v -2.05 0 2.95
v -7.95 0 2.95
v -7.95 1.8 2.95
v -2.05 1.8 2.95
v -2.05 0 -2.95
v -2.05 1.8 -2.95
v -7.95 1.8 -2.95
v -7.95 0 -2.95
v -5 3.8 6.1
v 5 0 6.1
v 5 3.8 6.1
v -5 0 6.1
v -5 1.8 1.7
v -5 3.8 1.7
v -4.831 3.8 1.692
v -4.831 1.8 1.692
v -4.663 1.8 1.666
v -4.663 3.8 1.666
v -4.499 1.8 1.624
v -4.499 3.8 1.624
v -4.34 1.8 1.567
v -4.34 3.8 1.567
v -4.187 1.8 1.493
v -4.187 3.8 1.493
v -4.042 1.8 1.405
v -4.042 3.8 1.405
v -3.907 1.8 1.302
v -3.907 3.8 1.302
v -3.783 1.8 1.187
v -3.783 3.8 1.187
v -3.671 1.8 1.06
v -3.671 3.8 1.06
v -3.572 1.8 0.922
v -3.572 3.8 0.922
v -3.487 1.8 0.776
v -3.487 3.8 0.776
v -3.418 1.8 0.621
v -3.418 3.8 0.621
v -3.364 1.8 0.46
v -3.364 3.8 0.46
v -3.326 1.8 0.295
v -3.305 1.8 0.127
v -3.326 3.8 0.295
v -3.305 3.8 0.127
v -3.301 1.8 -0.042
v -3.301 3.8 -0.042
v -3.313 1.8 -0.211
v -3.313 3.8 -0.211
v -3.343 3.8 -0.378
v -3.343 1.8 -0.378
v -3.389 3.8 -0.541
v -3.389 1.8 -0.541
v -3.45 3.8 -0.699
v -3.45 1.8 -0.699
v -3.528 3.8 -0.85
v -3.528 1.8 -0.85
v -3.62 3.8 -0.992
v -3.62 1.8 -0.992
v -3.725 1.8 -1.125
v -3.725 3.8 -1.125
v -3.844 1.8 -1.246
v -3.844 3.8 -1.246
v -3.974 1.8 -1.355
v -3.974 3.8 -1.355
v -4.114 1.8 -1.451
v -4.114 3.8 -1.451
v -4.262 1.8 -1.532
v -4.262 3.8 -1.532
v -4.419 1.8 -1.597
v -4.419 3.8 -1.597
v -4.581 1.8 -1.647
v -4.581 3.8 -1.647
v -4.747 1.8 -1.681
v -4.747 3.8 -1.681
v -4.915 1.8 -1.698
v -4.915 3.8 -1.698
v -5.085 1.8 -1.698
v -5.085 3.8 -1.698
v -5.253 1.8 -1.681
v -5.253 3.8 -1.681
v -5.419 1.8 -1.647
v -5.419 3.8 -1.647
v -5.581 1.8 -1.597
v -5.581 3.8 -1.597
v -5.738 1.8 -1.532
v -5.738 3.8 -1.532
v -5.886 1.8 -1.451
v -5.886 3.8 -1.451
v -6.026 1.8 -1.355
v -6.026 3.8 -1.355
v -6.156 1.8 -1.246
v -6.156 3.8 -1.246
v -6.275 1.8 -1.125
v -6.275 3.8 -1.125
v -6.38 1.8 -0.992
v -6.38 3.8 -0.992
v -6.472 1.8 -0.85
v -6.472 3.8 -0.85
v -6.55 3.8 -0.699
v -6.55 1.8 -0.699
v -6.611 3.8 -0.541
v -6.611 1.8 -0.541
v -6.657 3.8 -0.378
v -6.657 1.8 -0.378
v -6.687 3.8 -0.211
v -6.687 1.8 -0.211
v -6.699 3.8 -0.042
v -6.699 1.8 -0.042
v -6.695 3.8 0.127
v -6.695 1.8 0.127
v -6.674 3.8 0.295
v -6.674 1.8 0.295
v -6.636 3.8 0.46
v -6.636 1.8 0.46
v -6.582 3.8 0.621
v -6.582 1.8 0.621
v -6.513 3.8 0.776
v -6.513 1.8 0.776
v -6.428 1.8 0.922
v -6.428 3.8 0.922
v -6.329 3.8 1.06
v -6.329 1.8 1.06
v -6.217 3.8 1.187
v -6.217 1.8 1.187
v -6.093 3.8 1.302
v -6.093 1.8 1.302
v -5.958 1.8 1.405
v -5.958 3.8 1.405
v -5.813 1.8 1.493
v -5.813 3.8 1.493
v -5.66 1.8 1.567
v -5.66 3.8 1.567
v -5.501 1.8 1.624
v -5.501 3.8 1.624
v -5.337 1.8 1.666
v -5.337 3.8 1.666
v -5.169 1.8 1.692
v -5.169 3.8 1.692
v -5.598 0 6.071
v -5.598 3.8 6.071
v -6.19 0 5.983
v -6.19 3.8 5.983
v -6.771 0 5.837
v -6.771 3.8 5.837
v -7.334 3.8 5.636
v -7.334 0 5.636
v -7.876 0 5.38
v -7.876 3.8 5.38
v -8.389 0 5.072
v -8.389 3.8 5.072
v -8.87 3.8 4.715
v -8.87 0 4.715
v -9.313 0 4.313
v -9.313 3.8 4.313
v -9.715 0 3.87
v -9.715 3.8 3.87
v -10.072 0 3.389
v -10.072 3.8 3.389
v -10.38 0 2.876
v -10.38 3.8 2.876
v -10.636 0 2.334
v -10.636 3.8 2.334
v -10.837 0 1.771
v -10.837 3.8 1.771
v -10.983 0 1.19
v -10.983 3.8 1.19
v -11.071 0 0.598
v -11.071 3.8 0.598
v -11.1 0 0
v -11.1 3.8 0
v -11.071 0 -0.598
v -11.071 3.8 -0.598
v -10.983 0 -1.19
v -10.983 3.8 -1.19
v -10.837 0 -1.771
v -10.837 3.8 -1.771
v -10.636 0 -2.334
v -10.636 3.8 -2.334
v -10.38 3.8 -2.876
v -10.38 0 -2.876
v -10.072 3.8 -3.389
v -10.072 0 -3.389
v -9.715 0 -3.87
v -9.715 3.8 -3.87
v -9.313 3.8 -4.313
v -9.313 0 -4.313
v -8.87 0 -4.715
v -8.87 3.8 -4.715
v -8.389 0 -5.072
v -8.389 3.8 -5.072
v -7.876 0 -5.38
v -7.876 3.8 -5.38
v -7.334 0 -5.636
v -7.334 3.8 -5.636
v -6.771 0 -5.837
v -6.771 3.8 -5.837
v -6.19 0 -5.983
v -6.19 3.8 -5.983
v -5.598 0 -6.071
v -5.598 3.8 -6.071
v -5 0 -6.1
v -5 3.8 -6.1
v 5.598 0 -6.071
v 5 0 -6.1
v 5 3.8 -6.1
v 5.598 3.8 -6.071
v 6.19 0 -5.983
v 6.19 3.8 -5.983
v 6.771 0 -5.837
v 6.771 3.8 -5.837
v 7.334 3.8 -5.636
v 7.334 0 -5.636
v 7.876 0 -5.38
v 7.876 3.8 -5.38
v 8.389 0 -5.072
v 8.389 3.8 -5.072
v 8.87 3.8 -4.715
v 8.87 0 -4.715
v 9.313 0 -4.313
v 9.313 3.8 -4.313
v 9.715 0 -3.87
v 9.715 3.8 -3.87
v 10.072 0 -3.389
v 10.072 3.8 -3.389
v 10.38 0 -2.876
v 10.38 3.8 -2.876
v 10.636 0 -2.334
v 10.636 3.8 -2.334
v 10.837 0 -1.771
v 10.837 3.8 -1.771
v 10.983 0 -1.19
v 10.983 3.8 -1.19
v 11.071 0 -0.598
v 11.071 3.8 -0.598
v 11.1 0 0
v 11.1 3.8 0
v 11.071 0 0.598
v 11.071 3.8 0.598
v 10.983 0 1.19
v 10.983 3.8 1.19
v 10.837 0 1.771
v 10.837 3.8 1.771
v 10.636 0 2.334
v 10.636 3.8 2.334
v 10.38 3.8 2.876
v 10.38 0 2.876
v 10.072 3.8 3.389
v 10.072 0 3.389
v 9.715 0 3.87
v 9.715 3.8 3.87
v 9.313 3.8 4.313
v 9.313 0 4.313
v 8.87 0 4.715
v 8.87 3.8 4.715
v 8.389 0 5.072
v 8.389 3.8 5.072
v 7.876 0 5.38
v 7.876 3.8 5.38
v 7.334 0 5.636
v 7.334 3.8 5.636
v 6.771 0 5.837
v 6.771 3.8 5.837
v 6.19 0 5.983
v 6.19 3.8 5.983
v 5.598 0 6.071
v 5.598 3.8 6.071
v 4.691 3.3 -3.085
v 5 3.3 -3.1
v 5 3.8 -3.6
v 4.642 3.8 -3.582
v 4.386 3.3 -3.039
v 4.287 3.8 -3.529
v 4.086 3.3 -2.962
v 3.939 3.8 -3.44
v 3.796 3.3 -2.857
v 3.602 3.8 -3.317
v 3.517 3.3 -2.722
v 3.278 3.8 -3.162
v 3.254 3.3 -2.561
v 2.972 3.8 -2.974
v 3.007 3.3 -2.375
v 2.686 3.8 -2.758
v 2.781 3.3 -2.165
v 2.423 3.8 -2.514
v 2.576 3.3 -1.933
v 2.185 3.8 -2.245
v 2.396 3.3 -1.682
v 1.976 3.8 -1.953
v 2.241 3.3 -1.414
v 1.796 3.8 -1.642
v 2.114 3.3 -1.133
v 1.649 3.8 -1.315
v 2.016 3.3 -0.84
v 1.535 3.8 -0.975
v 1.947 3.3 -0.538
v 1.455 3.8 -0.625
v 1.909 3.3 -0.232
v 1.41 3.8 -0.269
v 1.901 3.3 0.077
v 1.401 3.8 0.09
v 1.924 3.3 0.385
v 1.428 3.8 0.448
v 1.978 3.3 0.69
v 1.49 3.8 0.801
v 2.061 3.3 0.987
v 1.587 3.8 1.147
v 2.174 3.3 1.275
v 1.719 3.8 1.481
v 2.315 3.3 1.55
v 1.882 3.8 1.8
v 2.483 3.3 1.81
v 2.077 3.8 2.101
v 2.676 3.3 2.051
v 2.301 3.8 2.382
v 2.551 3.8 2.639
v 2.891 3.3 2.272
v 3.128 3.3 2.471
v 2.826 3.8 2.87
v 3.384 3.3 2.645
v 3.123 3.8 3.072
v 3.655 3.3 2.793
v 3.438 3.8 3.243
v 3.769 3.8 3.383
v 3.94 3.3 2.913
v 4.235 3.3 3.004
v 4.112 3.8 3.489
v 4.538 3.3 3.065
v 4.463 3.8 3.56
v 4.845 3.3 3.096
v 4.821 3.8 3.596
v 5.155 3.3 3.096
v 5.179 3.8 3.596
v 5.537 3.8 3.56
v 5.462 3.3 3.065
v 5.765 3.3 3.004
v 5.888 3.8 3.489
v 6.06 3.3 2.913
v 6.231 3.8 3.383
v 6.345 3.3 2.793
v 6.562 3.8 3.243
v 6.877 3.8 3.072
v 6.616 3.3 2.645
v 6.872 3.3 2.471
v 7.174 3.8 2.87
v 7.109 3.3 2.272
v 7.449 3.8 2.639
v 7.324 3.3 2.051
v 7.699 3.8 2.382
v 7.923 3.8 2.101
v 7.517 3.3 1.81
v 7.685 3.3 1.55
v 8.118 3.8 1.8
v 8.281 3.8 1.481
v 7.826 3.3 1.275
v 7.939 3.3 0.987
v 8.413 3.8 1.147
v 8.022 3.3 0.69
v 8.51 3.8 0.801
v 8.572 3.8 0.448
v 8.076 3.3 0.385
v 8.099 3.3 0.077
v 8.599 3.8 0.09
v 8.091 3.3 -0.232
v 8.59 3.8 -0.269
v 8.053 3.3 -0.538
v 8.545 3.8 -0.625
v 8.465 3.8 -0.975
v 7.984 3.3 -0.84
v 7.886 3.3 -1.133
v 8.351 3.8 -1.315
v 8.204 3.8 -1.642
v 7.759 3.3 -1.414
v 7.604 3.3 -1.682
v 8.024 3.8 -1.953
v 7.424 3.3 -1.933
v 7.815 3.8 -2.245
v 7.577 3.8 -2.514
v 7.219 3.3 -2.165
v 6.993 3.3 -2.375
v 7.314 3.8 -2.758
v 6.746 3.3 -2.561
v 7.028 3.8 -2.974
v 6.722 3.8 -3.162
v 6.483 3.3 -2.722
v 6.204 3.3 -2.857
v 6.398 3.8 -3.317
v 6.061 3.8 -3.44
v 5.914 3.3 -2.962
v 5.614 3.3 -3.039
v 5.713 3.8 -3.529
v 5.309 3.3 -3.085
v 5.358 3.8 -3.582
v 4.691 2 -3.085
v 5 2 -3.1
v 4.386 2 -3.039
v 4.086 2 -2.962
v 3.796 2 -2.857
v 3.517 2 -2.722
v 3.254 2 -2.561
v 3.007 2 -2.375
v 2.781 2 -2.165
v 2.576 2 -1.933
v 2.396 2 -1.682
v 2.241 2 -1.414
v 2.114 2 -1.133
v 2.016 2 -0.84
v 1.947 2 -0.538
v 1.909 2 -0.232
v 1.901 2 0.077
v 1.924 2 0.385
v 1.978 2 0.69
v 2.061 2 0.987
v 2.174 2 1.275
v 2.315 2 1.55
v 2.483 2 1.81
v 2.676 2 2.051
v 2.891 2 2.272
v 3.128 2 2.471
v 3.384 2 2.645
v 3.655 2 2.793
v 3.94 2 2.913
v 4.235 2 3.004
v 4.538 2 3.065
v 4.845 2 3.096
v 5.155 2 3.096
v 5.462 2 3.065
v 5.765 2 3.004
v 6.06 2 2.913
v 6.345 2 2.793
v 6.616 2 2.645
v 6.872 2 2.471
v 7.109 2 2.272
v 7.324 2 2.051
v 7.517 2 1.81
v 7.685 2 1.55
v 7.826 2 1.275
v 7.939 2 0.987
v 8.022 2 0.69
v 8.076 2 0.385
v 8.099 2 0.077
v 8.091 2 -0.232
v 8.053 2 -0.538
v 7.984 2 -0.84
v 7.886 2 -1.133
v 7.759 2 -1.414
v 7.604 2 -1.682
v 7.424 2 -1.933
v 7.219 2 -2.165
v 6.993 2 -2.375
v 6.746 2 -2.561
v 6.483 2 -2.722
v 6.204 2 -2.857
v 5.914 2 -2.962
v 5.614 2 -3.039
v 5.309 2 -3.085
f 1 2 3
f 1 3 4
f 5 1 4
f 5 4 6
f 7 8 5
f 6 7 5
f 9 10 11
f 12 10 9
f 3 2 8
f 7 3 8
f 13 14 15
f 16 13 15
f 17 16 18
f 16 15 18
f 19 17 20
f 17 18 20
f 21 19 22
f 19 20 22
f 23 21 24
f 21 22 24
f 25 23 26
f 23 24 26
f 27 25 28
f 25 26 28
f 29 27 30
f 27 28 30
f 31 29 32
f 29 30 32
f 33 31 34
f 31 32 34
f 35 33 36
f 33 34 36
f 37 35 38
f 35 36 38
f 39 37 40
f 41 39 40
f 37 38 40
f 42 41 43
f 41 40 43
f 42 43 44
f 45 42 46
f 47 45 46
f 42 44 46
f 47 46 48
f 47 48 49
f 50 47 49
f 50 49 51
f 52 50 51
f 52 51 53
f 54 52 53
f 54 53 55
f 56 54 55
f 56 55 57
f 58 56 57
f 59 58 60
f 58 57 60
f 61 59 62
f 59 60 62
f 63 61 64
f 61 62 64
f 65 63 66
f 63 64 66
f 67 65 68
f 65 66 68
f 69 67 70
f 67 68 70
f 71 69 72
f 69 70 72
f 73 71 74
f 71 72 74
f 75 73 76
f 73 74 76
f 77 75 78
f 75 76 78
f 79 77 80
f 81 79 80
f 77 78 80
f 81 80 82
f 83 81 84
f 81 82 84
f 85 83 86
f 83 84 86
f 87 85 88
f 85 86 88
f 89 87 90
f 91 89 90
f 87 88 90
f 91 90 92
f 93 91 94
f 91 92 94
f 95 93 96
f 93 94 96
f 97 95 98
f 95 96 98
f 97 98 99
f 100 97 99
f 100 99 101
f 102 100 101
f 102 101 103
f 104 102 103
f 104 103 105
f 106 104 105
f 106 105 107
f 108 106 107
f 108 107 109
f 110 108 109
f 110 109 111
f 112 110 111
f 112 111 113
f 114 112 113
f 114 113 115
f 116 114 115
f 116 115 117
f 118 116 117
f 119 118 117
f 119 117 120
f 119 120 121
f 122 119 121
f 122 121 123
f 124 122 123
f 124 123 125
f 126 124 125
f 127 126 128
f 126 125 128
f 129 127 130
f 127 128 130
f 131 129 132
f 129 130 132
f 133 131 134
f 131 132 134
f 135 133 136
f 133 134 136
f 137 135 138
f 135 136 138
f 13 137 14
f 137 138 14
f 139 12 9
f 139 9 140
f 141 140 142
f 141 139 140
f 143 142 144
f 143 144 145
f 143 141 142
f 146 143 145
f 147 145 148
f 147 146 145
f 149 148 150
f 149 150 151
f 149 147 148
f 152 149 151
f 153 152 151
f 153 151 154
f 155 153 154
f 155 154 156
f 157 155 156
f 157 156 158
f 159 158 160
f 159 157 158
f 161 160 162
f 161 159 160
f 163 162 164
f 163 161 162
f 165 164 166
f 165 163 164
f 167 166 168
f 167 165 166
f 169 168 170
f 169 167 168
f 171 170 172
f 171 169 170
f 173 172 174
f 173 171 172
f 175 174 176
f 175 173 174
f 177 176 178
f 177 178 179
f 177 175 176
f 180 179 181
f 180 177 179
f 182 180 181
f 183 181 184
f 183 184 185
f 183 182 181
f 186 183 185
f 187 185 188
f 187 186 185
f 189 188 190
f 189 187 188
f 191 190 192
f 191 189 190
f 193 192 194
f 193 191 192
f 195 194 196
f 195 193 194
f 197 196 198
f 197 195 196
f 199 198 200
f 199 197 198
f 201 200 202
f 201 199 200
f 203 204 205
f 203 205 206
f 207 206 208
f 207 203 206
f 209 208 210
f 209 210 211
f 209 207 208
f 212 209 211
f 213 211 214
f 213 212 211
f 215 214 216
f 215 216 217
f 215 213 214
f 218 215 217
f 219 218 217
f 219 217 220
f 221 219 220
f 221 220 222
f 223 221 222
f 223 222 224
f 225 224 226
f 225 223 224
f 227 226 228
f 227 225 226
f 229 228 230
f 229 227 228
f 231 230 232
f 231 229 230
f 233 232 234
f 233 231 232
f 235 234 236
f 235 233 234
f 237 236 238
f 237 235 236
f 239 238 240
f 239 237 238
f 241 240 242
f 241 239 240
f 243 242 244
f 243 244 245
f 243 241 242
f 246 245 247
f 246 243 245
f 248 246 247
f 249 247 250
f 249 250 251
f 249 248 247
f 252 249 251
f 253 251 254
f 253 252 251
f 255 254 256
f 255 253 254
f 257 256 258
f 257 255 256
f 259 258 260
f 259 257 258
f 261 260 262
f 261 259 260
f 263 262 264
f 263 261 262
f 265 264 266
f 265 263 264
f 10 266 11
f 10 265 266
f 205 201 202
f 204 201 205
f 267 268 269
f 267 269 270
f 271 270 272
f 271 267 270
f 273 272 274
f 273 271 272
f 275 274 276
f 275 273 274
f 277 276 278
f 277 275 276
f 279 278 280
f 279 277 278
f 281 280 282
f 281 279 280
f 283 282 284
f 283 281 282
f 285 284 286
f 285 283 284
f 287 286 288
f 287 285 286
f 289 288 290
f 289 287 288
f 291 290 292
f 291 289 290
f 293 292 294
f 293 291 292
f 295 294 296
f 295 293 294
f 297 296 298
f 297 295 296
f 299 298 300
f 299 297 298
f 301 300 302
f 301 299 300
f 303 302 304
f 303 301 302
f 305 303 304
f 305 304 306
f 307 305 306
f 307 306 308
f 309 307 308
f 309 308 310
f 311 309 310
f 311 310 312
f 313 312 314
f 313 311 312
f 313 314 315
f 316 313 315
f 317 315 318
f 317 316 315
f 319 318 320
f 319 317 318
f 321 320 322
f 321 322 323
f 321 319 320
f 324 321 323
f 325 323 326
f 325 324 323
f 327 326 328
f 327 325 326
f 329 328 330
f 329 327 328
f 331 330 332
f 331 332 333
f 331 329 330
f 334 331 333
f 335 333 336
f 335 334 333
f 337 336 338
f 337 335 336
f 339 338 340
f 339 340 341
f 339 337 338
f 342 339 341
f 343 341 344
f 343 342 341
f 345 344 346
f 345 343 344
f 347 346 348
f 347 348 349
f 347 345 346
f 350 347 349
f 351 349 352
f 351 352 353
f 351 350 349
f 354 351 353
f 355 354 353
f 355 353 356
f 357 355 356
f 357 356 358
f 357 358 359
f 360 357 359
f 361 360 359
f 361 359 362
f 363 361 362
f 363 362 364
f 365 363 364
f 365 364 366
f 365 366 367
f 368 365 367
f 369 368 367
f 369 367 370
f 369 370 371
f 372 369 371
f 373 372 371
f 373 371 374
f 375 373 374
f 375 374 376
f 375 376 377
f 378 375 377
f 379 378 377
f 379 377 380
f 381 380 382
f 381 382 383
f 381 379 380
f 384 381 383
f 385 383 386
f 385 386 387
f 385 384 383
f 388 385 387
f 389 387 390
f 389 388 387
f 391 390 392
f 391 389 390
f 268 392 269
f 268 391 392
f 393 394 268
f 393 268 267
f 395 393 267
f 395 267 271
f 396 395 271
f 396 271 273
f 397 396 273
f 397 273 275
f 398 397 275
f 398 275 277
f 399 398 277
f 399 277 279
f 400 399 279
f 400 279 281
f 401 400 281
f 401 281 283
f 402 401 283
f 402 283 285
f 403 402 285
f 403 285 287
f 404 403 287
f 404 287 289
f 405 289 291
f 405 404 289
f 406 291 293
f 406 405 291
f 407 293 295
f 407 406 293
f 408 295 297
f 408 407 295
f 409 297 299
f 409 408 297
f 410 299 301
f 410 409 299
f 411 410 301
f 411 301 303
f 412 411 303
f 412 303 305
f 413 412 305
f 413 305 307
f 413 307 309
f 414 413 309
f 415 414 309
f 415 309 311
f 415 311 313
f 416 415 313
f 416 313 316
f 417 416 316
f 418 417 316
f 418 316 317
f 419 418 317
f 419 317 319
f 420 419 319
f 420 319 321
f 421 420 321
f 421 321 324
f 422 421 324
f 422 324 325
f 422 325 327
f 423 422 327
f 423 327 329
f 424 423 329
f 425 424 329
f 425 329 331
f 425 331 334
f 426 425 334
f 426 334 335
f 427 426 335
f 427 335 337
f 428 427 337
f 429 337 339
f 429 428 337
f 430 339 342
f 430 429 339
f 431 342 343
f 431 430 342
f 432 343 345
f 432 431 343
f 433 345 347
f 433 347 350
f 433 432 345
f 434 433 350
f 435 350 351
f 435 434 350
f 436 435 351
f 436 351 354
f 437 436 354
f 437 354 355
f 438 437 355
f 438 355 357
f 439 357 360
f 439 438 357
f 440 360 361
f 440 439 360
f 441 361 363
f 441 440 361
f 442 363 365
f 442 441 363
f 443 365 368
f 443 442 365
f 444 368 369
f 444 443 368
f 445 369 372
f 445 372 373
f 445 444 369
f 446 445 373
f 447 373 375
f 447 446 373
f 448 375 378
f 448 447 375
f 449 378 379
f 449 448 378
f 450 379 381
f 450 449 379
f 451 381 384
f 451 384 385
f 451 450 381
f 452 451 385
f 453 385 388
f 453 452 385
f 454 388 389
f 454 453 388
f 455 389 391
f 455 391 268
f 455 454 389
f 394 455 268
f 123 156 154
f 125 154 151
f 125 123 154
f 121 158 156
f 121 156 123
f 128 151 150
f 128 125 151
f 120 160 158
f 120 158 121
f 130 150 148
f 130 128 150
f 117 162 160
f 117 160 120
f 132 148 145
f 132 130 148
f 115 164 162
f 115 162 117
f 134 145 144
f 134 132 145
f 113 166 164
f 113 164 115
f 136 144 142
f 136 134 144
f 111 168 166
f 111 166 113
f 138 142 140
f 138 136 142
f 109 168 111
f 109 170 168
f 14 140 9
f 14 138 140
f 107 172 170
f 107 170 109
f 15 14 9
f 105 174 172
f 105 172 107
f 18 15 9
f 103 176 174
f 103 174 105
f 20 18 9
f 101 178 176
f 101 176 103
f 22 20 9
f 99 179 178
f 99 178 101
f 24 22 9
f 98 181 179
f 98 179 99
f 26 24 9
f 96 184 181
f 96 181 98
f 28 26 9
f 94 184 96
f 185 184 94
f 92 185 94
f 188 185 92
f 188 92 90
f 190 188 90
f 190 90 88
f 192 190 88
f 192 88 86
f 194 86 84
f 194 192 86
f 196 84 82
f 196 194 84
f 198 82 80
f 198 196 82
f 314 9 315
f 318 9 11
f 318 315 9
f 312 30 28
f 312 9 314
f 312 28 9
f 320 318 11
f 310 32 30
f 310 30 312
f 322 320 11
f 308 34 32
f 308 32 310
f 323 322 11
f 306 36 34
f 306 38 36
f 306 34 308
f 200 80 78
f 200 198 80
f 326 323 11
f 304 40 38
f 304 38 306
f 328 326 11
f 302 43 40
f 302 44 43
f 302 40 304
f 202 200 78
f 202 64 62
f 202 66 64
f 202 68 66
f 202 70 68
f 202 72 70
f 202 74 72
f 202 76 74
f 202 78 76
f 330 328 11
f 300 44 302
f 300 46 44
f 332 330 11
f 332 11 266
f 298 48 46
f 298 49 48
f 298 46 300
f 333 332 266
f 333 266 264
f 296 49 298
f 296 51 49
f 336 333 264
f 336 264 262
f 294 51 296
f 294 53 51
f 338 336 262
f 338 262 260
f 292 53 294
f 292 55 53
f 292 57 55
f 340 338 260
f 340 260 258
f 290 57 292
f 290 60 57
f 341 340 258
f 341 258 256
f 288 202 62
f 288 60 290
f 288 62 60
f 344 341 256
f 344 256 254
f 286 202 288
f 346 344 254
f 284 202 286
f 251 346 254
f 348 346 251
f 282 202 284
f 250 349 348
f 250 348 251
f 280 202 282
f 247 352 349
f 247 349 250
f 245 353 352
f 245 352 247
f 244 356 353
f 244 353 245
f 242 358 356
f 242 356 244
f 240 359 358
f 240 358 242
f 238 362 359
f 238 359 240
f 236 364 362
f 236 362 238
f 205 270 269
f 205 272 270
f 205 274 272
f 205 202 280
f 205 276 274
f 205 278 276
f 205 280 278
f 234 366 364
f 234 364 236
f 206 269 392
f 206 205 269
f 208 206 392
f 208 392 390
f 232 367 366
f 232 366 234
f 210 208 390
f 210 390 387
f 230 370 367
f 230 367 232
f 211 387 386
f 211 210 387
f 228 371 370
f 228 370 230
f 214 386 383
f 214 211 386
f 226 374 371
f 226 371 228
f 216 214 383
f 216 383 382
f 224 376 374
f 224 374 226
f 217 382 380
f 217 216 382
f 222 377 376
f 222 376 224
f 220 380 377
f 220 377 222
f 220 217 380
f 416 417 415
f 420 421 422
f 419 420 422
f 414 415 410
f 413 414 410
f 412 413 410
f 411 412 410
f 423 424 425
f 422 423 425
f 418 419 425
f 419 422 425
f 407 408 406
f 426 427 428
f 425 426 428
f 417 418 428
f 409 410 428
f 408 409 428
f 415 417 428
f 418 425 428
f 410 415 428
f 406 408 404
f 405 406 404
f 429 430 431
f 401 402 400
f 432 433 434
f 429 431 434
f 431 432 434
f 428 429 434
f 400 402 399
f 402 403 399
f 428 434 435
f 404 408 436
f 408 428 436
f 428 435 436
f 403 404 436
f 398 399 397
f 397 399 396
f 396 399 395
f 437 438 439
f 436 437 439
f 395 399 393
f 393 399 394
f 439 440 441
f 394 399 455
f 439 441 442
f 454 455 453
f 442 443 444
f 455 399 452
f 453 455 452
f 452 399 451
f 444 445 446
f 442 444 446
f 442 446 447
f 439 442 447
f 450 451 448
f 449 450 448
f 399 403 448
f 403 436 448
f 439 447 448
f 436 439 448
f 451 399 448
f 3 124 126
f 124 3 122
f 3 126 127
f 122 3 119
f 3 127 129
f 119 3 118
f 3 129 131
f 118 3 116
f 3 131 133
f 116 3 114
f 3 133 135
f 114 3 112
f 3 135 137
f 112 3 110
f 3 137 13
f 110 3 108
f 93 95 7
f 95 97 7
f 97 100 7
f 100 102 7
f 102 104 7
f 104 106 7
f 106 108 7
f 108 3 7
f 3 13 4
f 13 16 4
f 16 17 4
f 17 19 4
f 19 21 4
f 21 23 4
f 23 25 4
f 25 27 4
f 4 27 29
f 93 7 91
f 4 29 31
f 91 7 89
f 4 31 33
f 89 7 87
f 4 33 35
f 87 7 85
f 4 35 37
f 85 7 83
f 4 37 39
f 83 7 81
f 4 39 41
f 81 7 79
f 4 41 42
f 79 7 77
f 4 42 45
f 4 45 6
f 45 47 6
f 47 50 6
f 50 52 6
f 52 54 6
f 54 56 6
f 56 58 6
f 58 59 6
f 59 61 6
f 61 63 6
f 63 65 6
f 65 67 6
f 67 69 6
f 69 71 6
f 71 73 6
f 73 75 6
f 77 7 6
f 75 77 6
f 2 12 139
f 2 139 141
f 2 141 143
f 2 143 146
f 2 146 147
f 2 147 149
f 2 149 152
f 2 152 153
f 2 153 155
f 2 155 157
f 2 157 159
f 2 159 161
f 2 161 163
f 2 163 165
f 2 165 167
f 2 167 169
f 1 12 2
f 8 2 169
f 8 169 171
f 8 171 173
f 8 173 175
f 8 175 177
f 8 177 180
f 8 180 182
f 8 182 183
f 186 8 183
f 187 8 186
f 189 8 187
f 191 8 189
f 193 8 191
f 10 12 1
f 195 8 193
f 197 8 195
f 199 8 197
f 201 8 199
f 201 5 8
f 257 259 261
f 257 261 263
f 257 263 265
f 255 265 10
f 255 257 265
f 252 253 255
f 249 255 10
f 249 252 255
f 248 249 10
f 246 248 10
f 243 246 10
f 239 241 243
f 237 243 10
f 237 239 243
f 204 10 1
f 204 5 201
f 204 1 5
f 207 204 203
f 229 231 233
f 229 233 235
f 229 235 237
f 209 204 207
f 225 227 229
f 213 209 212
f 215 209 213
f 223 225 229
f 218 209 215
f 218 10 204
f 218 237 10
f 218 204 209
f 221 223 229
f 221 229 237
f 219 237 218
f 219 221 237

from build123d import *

# Parameters (mm, degrees)
SKETCH1_R           = 3.1
SKETCH1_W           = 5.9
SKETCH1_H           = 5.9
BOSS_EXTRUDE1_DEPTH = 3.8
SKETCH2_W           = 5.9
SKETCH2_H           = 5.9
SKETCH2_R           = 1.7
BOSS_EXTRUDE2_DEPTH = 2
SKETCH3_R           = 3.1
BOSS_EXTRUDE3_DEPTH = 2
CHAMFER1_SIZE       = 0.5


with BuildPart() as part:
    # Sketch1 → Boss-Extrude1 (new body)
    with BuildSketch(Plane(origin=(0, 0, 0), x_dir=(1, 0, 0), z_dir=(0, 1, 0))):
        with BuildLine():
            Line((-5, 6.1), (5, 6.1))
            ThreePointArc((5, 6.1), (11.1, 0), (5, -6.1))
            Line((5, -6.1), (-5, -6.1))
            ThreePointArc((-5, -6.1), (-11.1, 0), (-5, 6.1))
        make_face()
        with Locations(Location((5, 0, 0), (0, 0, 90))):
            Circle(SKETCH1_R, mode=Mode.SUBTRACT)
        with Locations((-5, 0)):
            Rectangle(SKETCH1_W, SKETCH1_H, mode=Mode.SUBTRACT)
    extrude(amount=BOSS_EXTRUDE1_DEPTH)

    # Sketch2 → Boss-Extrude2 (add)
    with BuildSketch(Plane(origin=(0, 3.8, 0), x_dir=(1, 0, 0), z_dir=(0, 1, 0))):
        with Locations((-5, 0)):
            Rectangle(SKETCH2_W, SKETCH2_H)
        with Locations(Location((-5, 0, 0), (0, 0, 270))):
            Circle(SKETCH2_R, mode=Mode.SUBTRACT)
    extrude(amount=-BOSS_EXTRUDE2_DEPTH)

    # Sketch3 → Boss-Extrude3 (add)
    with BuildSketch(Plane.XZ):
        with Locations(Location((5, 0, 0), (0, 0, 270))):
            Circle(SKETCH3_R)
    extrude(amount=-BOSS_EXTRUDE3_DEPTH)

    # Chamfer1
    chamfer1_edges = [part.edges().sort_by_distance(p)[0] for p in [
        (5, 3.8, 3.1),
    ]]
    chamfer(chamfer1_edges, length=CHAMFER1_SIZE)


solid = part.part
